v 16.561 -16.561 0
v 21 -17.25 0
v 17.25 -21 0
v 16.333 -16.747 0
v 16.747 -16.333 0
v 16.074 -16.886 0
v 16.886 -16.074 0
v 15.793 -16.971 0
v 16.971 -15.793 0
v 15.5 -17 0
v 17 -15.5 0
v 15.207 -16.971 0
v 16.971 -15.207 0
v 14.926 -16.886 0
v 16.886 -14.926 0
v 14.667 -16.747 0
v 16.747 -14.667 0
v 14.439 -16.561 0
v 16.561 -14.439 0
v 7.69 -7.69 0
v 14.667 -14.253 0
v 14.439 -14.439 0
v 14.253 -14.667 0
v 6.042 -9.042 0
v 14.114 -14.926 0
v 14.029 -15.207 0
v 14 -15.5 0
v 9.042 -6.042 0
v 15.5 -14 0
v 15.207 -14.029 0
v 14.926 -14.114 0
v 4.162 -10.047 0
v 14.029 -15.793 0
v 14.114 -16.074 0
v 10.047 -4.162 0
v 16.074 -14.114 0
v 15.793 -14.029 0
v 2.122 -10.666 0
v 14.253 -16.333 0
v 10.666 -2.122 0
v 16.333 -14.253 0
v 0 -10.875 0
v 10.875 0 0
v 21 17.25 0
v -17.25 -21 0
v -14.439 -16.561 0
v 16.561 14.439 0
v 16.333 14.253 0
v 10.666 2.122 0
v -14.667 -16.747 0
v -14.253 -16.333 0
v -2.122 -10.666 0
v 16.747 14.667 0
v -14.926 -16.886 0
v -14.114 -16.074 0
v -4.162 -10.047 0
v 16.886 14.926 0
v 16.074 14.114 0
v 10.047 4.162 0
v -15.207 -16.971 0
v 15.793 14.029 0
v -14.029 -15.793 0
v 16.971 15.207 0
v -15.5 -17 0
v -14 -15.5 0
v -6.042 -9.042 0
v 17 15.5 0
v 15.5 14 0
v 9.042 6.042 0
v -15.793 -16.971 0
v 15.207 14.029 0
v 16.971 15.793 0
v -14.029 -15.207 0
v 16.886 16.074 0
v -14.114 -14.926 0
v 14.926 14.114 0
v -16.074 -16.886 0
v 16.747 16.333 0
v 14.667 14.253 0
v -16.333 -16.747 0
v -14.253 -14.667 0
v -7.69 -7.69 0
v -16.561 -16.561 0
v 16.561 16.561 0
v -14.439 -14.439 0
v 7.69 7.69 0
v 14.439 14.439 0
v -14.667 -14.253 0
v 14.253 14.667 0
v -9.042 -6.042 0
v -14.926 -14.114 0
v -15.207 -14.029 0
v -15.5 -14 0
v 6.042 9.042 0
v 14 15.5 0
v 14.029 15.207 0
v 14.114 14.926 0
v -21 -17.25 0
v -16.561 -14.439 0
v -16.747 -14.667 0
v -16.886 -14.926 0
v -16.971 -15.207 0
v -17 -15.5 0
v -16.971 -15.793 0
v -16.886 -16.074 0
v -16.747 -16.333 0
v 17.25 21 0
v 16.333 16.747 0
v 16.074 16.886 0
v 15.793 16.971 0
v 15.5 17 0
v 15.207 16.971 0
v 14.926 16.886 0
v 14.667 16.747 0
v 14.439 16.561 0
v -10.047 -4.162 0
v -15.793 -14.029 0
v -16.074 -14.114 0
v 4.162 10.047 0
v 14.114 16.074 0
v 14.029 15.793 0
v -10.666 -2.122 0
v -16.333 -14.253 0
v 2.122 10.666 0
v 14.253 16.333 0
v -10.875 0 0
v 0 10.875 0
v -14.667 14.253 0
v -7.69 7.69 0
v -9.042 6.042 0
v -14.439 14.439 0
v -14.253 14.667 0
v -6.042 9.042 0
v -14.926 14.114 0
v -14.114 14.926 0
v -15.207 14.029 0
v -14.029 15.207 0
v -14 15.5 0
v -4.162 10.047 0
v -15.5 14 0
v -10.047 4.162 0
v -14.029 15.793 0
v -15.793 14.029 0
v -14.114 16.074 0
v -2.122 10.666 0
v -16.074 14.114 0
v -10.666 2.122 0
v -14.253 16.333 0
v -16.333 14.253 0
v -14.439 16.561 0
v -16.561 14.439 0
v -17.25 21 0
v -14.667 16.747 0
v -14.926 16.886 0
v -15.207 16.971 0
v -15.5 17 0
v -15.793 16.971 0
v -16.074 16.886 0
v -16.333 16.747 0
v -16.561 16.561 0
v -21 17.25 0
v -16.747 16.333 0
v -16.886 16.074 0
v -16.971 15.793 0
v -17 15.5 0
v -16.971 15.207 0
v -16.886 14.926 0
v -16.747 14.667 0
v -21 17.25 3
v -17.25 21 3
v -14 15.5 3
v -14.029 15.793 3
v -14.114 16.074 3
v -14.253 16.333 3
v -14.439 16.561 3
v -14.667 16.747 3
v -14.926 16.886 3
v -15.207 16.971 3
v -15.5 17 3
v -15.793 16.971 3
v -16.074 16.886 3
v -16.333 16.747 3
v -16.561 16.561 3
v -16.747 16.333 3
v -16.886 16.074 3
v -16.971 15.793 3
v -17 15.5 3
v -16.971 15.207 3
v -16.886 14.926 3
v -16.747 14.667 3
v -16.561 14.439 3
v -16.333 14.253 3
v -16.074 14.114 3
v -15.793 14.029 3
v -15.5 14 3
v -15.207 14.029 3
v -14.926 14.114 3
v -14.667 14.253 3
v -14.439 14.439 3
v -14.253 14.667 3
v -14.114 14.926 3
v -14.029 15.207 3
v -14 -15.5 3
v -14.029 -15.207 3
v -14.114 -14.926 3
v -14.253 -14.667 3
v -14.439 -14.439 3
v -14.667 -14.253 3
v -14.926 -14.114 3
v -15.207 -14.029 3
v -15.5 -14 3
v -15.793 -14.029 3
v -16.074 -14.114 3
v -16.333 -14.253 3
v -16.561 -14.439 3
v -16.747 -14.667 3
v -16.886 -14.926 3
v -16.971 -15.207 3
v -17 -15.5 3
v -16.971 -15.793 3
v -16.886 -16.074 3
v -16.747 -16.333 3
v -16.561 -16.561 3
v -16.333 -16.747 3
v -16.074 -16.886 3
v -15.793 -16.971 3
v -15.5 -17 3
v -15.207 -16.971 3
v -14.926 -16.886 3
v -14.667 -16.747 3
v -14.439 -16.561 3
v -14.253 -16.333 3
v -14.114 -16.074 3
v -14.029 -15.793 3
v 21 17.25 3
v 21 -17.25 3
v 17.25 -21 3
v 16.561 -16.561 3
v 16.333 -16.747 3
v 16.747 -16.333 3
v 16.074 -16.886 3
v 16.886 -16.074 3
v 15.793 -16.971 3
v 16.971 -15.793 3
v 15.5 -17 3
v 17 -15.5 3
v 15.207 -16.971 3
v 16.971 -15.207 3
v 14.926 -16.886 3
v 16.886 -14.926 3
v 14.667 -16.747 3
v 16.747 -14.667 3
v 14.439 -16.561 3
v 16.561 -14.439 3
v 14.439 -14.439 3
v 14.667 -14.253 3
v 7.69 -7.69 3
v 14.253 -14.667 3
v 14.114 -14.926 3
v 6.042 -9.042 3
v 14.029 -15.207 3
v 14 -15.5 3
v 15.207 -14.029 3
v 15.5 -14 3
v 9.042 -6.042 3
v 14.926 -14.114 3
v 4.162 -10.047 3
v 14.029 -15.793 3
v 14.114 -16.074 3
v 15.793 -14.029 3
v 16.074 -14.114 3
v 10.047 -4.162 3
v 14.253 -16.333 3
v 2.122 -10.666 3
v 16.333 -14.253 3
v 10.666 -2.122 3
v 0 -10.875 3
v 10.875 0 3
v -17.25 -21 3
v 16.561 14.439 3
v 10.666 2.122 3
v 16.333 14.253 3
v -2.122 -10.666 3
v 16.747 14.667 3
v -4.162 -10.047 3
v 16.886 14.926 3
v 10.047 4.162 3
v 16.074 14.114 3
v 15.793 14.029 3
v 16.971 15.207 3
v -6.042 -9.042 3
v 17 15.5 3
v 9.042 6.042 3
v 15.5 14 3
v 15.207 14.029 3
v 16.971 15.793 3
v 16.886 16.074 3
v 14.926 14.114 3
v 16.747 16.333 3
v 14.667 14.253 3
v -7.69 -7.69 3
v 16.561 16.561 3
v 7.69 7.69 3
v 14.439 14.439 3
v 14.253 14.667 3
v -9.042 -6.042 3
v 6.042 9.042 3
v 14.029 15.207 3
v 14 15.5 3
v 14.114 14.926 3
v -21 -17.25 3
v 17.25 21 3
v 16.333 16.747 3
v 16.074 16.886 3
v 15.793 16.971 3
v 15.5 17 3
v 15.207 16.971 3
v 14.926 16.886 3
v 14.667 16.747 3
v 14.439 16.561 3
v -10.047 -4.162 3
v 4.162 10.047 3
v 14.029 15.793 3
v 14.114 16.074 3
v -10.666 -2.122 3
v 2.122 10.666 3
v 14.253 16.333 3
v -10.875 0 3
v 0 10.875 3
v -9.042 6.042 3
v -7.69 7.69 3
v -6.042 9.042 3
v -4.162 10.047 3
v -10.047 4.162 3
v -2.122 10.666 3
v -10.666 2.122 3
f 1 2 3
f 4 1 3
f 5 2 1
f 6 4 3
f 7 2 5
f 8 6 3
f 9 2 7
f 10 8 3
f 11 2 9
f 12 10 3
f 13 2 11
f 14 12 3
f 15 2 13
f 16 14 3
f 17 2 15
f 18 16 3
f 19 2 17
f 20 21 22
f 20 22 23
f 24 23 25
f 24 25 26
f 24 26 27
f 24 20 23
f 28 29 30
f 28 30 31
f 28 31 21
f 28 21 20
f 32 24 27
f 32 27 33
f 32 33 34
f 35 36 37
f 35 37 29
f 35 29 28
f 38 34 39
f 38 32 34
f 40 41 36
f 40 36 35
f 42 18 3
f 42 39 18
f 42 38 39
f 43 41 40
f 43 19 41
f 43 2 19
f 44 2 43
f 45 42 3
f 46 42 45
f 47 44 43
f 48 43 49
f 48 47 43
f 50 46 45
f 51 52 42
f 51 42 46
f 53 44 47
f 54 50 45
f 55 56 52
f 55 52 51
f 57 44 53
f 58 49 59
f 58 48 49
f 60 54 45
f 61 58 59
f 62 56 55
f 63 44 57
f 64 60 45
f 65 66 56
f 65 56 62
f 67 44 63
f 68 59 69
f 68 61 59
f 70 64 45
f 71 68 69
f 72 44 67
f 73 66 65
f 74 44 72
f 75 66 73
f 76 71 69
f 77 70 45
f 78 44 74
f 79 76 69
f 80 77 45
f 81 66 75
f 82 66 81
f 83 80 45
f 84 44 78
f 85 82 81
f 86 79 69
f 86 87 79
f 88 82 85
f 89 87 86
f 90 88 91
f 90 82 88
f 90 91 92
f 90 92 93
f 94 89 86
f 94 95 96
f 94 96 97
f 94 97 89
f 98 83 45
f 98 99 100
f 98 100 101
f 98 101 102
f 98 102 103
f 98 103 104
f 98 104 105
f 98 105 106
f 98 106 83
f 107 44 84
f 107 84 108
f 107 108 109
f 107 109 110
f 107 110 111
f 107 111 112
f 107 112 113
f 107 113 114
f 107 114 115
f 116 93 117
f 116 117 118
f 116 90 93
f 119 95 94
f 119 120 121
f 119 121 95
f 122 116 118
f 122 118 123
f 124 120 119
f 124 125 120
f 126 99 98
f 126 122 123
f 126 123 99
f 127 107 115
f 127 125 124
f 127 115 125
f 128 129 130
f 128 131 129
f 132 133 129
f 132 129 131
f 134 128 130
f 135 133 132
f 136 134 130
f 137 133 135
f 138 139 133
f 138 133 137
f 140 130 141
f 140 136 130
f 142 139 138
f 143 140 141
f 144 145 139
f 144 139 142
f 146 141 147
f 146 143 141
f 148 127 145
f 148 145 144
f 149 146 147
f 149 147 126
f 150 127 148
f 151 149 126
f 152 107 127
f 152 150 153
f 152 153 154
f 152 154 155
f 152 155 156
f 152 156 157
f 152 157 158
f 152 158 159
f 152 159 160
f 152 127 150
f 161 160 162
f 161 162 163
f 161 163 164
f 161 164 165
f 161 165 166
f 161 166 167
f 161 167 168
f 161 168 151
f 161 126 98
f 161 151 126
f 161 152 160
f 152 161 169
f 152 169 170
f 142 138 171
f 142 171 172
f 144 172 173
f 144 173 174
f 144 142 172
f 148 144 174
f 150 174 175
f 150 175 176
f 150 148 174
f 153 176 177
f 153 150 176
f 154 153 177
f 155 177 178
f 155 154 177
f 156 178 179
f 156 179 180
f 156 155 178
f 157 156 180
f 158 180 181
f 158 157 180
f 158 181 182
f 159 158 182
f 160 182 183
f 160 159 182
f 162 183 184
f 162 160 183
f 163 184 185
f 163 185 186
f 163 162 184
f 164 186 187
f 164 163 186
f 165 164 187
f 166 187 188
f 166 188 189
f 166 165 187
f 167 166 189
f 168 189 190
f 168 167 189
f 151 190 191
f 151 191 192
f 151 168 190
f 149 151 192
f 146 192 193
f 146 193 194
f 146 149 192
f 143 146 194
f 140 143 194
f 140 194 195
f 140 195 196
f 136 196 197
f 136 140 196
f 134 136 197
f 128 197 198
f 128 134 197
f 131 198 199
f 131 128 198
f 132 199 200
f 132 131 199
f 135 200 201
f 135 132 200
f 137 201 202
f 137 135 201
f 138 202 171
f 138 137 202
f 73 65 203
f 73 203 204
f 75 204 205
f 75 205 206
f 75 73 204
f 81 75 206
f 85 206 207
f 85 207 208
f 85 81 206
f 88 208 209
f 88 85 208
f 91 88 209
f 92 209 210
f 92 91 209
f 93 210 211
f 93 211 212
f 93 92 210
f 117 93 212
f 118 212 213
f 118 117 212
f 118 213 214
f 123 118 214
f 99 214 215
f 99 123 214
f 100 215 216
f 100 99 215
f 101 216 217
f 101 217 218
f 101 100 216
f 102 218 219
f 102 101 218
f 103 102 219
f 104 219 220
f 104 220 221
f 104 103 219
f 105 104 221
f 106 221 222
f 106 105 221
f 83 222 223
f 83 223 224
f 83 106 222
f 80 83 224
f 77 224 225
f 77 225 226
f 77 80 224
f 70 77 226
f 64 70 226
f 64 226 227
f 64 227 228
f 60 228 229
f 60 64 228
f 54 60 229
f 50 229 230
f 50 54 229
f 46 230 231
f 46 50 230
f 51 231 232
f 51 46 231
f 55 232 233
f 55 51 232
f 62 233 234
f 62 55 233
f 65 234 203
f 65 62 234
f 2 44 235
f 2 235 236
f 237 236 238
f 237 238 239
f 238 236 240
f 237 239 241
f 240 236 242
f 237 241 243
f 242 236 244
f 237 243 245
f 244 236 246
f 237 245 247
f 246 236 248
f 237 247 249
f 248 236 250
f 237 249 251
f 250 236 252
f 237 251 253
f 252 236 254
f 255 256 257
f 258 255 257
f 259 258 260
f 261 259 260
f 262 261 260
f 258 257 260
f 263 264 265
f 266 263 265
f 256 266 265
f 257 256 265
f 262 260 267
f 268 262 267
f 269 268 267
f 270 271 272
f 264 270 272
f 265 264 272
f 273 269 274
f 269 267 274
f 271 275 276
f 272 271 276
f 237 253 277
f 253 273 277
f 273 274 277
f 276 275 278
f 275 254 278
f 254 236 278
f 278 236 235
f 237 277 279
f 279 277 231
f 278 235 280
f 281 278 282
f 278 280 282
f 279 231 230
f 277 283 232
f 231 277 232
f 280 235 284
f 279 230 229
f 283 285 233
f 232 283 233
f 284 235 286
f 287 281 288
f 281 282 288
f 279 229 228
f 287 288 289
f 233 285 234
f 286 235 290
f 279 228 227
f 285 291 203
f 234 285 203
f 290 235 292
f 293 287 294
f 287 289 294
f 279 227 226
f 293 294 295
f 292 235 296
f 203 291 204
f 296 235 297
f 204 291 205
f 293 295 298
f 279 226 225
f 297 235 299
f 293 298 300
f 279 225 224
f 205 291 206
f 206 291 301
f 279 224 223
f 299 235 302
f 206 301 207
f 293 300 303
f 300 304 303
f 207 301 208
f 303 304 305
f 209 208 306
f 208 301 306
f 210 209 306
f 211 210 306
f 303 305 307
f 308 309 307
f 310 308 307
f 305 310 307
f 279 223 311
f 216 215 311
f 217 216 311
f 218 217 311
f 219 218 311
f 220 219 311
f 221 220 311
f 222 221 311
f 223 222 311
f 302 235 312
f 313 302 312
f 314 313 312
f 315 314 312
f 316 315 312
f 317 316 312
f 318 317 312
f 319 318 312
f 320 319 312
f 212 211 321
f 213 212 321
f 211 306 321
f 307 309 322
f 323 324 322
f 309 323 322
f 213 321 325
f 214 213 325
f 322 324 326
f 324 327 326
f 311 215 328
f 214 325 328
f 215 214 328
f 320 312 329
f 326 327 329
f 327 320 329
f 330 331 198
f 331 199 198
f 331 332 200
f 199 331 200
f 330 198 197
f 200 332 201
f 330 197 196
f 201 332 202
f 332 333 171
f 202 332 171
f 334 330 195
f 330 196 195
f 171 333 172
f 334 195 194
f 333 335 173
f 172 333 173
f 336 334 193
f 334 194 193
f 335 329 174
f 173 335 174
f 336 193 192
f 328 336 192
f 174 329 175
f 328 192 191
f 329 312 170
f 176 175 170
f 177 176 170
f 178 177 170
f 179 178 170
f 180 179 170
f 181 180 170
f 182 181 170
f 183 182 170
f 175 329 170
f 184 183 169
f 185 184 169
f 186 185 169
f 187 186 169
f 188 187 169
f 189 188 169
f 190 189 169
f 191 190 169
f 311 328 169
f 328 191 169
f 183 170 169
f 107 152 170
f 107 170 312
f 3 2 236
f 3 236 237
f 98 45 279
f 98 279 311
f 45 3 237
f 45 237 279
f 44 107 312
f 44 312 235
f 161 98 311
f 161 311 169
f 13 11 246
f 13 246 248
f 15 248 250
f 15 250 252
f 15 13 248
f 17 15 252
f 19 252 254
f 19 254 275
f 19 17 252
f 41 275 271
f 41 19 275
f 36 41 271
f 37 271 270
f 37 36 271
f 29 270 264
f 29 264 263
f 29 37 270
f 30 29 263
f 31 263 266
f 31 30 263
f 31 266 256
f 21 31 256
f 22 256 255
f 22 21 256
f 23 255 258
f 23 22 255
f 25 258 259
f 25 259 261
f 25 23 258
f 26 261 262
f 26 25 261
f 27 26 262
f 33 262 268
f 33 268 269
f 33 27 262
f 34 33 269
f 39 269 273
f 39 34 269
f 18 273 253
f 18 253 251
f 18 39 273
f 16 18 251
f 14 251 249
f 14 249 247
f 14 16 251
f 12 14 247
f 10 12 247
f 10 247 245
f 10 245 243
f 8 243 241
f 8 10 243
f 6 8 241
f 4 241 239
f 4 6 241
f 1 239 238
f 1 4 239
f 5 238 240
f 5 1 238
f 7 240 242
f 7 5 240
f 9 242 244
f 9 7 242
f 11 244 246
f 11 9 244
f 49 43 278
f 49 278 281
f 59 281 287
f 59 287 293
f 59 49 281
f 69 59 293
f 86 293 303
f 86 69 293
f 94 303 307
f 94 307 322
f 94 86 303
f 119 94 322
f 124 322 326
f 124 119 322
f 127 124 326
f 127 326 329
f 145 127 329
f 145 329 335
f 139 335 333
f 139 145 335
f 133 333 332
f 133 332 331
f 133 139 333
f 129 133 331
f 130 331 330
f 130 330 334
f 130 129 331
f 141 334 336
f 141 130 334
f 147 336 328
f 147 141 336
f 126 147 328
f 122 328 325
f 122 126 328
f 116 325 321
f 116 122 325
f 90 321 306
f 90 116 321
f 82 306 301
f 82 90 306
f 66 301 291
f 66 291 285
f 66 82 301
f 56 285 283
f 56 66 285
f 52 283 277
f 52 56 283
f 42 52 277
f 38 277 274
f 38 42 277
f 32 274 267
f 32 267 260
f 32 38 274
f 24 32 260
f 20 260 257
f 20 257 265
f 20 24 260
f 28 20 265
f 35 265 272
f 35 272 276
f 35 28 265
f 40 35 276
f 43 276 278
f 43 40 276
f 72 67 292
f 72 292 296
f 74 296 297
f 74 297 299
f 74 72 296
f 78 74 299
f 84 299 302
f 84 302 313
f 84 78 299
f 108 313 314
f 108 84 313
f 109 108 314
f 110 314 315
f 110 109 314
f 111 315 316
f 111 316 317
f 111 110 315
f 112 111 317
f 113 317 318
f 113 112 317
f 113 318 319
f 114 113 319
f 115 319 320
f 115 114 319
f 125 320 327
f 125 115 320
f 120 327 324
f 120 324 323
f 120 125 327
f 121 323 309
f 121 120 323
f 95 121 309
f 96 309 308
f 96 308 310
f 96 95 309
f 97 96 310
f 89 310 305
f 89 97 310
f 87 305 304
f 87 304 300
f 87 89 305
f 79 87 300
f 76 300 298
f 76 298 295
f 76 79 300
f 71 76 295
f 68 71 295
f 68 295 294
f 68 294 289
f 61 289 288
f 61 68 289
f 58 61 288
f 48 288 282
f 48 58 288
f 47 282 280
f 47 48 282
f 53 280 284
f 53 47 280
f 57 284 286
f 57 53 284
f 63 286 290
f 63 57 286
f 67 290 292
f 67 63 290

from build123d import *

# Parameters (mm, degrees)
SKETCH_1_R      = 1.5
SKETCH_1_R_2    = 10.875
EXTRUDE_1_DEPTH = 3


with BuildPart() as part:
    # Эскиз1 → Бобышка-Вытянуть1 (new body)
    with BuildSketch(Plane.XY):
        Polygon((17.25, 21), (21, 17.25), (21, -17.25), (17.25, -21), (-17.25, -21), (-21, -17.25), (-21, 17.25), (-17.25, 21), align=None)
        with Locations((-15.5, 15.5)):
            Circle(SKETCH_1_R, mode=Mode.SUBTRACT)
        with Locations((15.5, 15.5)):
            Circle(SKETCH_1_R, mode=Mode.SUBTRACT)
        with Locations((15.5, -15.5)):
            Circle(SKETCH_1_R, mode=Mode.SUBTRACT)
        with Locations((-15.5, -15.5)):
            Circle(SKETCH_1_R, mode=Mode.SUBTRACT)
        Circle(SKETCH_1_R_2, mode=Mode.SUBTRACT)
    extrude(amount=EXTRUDE_1_DEPTH)


solid = part.part
